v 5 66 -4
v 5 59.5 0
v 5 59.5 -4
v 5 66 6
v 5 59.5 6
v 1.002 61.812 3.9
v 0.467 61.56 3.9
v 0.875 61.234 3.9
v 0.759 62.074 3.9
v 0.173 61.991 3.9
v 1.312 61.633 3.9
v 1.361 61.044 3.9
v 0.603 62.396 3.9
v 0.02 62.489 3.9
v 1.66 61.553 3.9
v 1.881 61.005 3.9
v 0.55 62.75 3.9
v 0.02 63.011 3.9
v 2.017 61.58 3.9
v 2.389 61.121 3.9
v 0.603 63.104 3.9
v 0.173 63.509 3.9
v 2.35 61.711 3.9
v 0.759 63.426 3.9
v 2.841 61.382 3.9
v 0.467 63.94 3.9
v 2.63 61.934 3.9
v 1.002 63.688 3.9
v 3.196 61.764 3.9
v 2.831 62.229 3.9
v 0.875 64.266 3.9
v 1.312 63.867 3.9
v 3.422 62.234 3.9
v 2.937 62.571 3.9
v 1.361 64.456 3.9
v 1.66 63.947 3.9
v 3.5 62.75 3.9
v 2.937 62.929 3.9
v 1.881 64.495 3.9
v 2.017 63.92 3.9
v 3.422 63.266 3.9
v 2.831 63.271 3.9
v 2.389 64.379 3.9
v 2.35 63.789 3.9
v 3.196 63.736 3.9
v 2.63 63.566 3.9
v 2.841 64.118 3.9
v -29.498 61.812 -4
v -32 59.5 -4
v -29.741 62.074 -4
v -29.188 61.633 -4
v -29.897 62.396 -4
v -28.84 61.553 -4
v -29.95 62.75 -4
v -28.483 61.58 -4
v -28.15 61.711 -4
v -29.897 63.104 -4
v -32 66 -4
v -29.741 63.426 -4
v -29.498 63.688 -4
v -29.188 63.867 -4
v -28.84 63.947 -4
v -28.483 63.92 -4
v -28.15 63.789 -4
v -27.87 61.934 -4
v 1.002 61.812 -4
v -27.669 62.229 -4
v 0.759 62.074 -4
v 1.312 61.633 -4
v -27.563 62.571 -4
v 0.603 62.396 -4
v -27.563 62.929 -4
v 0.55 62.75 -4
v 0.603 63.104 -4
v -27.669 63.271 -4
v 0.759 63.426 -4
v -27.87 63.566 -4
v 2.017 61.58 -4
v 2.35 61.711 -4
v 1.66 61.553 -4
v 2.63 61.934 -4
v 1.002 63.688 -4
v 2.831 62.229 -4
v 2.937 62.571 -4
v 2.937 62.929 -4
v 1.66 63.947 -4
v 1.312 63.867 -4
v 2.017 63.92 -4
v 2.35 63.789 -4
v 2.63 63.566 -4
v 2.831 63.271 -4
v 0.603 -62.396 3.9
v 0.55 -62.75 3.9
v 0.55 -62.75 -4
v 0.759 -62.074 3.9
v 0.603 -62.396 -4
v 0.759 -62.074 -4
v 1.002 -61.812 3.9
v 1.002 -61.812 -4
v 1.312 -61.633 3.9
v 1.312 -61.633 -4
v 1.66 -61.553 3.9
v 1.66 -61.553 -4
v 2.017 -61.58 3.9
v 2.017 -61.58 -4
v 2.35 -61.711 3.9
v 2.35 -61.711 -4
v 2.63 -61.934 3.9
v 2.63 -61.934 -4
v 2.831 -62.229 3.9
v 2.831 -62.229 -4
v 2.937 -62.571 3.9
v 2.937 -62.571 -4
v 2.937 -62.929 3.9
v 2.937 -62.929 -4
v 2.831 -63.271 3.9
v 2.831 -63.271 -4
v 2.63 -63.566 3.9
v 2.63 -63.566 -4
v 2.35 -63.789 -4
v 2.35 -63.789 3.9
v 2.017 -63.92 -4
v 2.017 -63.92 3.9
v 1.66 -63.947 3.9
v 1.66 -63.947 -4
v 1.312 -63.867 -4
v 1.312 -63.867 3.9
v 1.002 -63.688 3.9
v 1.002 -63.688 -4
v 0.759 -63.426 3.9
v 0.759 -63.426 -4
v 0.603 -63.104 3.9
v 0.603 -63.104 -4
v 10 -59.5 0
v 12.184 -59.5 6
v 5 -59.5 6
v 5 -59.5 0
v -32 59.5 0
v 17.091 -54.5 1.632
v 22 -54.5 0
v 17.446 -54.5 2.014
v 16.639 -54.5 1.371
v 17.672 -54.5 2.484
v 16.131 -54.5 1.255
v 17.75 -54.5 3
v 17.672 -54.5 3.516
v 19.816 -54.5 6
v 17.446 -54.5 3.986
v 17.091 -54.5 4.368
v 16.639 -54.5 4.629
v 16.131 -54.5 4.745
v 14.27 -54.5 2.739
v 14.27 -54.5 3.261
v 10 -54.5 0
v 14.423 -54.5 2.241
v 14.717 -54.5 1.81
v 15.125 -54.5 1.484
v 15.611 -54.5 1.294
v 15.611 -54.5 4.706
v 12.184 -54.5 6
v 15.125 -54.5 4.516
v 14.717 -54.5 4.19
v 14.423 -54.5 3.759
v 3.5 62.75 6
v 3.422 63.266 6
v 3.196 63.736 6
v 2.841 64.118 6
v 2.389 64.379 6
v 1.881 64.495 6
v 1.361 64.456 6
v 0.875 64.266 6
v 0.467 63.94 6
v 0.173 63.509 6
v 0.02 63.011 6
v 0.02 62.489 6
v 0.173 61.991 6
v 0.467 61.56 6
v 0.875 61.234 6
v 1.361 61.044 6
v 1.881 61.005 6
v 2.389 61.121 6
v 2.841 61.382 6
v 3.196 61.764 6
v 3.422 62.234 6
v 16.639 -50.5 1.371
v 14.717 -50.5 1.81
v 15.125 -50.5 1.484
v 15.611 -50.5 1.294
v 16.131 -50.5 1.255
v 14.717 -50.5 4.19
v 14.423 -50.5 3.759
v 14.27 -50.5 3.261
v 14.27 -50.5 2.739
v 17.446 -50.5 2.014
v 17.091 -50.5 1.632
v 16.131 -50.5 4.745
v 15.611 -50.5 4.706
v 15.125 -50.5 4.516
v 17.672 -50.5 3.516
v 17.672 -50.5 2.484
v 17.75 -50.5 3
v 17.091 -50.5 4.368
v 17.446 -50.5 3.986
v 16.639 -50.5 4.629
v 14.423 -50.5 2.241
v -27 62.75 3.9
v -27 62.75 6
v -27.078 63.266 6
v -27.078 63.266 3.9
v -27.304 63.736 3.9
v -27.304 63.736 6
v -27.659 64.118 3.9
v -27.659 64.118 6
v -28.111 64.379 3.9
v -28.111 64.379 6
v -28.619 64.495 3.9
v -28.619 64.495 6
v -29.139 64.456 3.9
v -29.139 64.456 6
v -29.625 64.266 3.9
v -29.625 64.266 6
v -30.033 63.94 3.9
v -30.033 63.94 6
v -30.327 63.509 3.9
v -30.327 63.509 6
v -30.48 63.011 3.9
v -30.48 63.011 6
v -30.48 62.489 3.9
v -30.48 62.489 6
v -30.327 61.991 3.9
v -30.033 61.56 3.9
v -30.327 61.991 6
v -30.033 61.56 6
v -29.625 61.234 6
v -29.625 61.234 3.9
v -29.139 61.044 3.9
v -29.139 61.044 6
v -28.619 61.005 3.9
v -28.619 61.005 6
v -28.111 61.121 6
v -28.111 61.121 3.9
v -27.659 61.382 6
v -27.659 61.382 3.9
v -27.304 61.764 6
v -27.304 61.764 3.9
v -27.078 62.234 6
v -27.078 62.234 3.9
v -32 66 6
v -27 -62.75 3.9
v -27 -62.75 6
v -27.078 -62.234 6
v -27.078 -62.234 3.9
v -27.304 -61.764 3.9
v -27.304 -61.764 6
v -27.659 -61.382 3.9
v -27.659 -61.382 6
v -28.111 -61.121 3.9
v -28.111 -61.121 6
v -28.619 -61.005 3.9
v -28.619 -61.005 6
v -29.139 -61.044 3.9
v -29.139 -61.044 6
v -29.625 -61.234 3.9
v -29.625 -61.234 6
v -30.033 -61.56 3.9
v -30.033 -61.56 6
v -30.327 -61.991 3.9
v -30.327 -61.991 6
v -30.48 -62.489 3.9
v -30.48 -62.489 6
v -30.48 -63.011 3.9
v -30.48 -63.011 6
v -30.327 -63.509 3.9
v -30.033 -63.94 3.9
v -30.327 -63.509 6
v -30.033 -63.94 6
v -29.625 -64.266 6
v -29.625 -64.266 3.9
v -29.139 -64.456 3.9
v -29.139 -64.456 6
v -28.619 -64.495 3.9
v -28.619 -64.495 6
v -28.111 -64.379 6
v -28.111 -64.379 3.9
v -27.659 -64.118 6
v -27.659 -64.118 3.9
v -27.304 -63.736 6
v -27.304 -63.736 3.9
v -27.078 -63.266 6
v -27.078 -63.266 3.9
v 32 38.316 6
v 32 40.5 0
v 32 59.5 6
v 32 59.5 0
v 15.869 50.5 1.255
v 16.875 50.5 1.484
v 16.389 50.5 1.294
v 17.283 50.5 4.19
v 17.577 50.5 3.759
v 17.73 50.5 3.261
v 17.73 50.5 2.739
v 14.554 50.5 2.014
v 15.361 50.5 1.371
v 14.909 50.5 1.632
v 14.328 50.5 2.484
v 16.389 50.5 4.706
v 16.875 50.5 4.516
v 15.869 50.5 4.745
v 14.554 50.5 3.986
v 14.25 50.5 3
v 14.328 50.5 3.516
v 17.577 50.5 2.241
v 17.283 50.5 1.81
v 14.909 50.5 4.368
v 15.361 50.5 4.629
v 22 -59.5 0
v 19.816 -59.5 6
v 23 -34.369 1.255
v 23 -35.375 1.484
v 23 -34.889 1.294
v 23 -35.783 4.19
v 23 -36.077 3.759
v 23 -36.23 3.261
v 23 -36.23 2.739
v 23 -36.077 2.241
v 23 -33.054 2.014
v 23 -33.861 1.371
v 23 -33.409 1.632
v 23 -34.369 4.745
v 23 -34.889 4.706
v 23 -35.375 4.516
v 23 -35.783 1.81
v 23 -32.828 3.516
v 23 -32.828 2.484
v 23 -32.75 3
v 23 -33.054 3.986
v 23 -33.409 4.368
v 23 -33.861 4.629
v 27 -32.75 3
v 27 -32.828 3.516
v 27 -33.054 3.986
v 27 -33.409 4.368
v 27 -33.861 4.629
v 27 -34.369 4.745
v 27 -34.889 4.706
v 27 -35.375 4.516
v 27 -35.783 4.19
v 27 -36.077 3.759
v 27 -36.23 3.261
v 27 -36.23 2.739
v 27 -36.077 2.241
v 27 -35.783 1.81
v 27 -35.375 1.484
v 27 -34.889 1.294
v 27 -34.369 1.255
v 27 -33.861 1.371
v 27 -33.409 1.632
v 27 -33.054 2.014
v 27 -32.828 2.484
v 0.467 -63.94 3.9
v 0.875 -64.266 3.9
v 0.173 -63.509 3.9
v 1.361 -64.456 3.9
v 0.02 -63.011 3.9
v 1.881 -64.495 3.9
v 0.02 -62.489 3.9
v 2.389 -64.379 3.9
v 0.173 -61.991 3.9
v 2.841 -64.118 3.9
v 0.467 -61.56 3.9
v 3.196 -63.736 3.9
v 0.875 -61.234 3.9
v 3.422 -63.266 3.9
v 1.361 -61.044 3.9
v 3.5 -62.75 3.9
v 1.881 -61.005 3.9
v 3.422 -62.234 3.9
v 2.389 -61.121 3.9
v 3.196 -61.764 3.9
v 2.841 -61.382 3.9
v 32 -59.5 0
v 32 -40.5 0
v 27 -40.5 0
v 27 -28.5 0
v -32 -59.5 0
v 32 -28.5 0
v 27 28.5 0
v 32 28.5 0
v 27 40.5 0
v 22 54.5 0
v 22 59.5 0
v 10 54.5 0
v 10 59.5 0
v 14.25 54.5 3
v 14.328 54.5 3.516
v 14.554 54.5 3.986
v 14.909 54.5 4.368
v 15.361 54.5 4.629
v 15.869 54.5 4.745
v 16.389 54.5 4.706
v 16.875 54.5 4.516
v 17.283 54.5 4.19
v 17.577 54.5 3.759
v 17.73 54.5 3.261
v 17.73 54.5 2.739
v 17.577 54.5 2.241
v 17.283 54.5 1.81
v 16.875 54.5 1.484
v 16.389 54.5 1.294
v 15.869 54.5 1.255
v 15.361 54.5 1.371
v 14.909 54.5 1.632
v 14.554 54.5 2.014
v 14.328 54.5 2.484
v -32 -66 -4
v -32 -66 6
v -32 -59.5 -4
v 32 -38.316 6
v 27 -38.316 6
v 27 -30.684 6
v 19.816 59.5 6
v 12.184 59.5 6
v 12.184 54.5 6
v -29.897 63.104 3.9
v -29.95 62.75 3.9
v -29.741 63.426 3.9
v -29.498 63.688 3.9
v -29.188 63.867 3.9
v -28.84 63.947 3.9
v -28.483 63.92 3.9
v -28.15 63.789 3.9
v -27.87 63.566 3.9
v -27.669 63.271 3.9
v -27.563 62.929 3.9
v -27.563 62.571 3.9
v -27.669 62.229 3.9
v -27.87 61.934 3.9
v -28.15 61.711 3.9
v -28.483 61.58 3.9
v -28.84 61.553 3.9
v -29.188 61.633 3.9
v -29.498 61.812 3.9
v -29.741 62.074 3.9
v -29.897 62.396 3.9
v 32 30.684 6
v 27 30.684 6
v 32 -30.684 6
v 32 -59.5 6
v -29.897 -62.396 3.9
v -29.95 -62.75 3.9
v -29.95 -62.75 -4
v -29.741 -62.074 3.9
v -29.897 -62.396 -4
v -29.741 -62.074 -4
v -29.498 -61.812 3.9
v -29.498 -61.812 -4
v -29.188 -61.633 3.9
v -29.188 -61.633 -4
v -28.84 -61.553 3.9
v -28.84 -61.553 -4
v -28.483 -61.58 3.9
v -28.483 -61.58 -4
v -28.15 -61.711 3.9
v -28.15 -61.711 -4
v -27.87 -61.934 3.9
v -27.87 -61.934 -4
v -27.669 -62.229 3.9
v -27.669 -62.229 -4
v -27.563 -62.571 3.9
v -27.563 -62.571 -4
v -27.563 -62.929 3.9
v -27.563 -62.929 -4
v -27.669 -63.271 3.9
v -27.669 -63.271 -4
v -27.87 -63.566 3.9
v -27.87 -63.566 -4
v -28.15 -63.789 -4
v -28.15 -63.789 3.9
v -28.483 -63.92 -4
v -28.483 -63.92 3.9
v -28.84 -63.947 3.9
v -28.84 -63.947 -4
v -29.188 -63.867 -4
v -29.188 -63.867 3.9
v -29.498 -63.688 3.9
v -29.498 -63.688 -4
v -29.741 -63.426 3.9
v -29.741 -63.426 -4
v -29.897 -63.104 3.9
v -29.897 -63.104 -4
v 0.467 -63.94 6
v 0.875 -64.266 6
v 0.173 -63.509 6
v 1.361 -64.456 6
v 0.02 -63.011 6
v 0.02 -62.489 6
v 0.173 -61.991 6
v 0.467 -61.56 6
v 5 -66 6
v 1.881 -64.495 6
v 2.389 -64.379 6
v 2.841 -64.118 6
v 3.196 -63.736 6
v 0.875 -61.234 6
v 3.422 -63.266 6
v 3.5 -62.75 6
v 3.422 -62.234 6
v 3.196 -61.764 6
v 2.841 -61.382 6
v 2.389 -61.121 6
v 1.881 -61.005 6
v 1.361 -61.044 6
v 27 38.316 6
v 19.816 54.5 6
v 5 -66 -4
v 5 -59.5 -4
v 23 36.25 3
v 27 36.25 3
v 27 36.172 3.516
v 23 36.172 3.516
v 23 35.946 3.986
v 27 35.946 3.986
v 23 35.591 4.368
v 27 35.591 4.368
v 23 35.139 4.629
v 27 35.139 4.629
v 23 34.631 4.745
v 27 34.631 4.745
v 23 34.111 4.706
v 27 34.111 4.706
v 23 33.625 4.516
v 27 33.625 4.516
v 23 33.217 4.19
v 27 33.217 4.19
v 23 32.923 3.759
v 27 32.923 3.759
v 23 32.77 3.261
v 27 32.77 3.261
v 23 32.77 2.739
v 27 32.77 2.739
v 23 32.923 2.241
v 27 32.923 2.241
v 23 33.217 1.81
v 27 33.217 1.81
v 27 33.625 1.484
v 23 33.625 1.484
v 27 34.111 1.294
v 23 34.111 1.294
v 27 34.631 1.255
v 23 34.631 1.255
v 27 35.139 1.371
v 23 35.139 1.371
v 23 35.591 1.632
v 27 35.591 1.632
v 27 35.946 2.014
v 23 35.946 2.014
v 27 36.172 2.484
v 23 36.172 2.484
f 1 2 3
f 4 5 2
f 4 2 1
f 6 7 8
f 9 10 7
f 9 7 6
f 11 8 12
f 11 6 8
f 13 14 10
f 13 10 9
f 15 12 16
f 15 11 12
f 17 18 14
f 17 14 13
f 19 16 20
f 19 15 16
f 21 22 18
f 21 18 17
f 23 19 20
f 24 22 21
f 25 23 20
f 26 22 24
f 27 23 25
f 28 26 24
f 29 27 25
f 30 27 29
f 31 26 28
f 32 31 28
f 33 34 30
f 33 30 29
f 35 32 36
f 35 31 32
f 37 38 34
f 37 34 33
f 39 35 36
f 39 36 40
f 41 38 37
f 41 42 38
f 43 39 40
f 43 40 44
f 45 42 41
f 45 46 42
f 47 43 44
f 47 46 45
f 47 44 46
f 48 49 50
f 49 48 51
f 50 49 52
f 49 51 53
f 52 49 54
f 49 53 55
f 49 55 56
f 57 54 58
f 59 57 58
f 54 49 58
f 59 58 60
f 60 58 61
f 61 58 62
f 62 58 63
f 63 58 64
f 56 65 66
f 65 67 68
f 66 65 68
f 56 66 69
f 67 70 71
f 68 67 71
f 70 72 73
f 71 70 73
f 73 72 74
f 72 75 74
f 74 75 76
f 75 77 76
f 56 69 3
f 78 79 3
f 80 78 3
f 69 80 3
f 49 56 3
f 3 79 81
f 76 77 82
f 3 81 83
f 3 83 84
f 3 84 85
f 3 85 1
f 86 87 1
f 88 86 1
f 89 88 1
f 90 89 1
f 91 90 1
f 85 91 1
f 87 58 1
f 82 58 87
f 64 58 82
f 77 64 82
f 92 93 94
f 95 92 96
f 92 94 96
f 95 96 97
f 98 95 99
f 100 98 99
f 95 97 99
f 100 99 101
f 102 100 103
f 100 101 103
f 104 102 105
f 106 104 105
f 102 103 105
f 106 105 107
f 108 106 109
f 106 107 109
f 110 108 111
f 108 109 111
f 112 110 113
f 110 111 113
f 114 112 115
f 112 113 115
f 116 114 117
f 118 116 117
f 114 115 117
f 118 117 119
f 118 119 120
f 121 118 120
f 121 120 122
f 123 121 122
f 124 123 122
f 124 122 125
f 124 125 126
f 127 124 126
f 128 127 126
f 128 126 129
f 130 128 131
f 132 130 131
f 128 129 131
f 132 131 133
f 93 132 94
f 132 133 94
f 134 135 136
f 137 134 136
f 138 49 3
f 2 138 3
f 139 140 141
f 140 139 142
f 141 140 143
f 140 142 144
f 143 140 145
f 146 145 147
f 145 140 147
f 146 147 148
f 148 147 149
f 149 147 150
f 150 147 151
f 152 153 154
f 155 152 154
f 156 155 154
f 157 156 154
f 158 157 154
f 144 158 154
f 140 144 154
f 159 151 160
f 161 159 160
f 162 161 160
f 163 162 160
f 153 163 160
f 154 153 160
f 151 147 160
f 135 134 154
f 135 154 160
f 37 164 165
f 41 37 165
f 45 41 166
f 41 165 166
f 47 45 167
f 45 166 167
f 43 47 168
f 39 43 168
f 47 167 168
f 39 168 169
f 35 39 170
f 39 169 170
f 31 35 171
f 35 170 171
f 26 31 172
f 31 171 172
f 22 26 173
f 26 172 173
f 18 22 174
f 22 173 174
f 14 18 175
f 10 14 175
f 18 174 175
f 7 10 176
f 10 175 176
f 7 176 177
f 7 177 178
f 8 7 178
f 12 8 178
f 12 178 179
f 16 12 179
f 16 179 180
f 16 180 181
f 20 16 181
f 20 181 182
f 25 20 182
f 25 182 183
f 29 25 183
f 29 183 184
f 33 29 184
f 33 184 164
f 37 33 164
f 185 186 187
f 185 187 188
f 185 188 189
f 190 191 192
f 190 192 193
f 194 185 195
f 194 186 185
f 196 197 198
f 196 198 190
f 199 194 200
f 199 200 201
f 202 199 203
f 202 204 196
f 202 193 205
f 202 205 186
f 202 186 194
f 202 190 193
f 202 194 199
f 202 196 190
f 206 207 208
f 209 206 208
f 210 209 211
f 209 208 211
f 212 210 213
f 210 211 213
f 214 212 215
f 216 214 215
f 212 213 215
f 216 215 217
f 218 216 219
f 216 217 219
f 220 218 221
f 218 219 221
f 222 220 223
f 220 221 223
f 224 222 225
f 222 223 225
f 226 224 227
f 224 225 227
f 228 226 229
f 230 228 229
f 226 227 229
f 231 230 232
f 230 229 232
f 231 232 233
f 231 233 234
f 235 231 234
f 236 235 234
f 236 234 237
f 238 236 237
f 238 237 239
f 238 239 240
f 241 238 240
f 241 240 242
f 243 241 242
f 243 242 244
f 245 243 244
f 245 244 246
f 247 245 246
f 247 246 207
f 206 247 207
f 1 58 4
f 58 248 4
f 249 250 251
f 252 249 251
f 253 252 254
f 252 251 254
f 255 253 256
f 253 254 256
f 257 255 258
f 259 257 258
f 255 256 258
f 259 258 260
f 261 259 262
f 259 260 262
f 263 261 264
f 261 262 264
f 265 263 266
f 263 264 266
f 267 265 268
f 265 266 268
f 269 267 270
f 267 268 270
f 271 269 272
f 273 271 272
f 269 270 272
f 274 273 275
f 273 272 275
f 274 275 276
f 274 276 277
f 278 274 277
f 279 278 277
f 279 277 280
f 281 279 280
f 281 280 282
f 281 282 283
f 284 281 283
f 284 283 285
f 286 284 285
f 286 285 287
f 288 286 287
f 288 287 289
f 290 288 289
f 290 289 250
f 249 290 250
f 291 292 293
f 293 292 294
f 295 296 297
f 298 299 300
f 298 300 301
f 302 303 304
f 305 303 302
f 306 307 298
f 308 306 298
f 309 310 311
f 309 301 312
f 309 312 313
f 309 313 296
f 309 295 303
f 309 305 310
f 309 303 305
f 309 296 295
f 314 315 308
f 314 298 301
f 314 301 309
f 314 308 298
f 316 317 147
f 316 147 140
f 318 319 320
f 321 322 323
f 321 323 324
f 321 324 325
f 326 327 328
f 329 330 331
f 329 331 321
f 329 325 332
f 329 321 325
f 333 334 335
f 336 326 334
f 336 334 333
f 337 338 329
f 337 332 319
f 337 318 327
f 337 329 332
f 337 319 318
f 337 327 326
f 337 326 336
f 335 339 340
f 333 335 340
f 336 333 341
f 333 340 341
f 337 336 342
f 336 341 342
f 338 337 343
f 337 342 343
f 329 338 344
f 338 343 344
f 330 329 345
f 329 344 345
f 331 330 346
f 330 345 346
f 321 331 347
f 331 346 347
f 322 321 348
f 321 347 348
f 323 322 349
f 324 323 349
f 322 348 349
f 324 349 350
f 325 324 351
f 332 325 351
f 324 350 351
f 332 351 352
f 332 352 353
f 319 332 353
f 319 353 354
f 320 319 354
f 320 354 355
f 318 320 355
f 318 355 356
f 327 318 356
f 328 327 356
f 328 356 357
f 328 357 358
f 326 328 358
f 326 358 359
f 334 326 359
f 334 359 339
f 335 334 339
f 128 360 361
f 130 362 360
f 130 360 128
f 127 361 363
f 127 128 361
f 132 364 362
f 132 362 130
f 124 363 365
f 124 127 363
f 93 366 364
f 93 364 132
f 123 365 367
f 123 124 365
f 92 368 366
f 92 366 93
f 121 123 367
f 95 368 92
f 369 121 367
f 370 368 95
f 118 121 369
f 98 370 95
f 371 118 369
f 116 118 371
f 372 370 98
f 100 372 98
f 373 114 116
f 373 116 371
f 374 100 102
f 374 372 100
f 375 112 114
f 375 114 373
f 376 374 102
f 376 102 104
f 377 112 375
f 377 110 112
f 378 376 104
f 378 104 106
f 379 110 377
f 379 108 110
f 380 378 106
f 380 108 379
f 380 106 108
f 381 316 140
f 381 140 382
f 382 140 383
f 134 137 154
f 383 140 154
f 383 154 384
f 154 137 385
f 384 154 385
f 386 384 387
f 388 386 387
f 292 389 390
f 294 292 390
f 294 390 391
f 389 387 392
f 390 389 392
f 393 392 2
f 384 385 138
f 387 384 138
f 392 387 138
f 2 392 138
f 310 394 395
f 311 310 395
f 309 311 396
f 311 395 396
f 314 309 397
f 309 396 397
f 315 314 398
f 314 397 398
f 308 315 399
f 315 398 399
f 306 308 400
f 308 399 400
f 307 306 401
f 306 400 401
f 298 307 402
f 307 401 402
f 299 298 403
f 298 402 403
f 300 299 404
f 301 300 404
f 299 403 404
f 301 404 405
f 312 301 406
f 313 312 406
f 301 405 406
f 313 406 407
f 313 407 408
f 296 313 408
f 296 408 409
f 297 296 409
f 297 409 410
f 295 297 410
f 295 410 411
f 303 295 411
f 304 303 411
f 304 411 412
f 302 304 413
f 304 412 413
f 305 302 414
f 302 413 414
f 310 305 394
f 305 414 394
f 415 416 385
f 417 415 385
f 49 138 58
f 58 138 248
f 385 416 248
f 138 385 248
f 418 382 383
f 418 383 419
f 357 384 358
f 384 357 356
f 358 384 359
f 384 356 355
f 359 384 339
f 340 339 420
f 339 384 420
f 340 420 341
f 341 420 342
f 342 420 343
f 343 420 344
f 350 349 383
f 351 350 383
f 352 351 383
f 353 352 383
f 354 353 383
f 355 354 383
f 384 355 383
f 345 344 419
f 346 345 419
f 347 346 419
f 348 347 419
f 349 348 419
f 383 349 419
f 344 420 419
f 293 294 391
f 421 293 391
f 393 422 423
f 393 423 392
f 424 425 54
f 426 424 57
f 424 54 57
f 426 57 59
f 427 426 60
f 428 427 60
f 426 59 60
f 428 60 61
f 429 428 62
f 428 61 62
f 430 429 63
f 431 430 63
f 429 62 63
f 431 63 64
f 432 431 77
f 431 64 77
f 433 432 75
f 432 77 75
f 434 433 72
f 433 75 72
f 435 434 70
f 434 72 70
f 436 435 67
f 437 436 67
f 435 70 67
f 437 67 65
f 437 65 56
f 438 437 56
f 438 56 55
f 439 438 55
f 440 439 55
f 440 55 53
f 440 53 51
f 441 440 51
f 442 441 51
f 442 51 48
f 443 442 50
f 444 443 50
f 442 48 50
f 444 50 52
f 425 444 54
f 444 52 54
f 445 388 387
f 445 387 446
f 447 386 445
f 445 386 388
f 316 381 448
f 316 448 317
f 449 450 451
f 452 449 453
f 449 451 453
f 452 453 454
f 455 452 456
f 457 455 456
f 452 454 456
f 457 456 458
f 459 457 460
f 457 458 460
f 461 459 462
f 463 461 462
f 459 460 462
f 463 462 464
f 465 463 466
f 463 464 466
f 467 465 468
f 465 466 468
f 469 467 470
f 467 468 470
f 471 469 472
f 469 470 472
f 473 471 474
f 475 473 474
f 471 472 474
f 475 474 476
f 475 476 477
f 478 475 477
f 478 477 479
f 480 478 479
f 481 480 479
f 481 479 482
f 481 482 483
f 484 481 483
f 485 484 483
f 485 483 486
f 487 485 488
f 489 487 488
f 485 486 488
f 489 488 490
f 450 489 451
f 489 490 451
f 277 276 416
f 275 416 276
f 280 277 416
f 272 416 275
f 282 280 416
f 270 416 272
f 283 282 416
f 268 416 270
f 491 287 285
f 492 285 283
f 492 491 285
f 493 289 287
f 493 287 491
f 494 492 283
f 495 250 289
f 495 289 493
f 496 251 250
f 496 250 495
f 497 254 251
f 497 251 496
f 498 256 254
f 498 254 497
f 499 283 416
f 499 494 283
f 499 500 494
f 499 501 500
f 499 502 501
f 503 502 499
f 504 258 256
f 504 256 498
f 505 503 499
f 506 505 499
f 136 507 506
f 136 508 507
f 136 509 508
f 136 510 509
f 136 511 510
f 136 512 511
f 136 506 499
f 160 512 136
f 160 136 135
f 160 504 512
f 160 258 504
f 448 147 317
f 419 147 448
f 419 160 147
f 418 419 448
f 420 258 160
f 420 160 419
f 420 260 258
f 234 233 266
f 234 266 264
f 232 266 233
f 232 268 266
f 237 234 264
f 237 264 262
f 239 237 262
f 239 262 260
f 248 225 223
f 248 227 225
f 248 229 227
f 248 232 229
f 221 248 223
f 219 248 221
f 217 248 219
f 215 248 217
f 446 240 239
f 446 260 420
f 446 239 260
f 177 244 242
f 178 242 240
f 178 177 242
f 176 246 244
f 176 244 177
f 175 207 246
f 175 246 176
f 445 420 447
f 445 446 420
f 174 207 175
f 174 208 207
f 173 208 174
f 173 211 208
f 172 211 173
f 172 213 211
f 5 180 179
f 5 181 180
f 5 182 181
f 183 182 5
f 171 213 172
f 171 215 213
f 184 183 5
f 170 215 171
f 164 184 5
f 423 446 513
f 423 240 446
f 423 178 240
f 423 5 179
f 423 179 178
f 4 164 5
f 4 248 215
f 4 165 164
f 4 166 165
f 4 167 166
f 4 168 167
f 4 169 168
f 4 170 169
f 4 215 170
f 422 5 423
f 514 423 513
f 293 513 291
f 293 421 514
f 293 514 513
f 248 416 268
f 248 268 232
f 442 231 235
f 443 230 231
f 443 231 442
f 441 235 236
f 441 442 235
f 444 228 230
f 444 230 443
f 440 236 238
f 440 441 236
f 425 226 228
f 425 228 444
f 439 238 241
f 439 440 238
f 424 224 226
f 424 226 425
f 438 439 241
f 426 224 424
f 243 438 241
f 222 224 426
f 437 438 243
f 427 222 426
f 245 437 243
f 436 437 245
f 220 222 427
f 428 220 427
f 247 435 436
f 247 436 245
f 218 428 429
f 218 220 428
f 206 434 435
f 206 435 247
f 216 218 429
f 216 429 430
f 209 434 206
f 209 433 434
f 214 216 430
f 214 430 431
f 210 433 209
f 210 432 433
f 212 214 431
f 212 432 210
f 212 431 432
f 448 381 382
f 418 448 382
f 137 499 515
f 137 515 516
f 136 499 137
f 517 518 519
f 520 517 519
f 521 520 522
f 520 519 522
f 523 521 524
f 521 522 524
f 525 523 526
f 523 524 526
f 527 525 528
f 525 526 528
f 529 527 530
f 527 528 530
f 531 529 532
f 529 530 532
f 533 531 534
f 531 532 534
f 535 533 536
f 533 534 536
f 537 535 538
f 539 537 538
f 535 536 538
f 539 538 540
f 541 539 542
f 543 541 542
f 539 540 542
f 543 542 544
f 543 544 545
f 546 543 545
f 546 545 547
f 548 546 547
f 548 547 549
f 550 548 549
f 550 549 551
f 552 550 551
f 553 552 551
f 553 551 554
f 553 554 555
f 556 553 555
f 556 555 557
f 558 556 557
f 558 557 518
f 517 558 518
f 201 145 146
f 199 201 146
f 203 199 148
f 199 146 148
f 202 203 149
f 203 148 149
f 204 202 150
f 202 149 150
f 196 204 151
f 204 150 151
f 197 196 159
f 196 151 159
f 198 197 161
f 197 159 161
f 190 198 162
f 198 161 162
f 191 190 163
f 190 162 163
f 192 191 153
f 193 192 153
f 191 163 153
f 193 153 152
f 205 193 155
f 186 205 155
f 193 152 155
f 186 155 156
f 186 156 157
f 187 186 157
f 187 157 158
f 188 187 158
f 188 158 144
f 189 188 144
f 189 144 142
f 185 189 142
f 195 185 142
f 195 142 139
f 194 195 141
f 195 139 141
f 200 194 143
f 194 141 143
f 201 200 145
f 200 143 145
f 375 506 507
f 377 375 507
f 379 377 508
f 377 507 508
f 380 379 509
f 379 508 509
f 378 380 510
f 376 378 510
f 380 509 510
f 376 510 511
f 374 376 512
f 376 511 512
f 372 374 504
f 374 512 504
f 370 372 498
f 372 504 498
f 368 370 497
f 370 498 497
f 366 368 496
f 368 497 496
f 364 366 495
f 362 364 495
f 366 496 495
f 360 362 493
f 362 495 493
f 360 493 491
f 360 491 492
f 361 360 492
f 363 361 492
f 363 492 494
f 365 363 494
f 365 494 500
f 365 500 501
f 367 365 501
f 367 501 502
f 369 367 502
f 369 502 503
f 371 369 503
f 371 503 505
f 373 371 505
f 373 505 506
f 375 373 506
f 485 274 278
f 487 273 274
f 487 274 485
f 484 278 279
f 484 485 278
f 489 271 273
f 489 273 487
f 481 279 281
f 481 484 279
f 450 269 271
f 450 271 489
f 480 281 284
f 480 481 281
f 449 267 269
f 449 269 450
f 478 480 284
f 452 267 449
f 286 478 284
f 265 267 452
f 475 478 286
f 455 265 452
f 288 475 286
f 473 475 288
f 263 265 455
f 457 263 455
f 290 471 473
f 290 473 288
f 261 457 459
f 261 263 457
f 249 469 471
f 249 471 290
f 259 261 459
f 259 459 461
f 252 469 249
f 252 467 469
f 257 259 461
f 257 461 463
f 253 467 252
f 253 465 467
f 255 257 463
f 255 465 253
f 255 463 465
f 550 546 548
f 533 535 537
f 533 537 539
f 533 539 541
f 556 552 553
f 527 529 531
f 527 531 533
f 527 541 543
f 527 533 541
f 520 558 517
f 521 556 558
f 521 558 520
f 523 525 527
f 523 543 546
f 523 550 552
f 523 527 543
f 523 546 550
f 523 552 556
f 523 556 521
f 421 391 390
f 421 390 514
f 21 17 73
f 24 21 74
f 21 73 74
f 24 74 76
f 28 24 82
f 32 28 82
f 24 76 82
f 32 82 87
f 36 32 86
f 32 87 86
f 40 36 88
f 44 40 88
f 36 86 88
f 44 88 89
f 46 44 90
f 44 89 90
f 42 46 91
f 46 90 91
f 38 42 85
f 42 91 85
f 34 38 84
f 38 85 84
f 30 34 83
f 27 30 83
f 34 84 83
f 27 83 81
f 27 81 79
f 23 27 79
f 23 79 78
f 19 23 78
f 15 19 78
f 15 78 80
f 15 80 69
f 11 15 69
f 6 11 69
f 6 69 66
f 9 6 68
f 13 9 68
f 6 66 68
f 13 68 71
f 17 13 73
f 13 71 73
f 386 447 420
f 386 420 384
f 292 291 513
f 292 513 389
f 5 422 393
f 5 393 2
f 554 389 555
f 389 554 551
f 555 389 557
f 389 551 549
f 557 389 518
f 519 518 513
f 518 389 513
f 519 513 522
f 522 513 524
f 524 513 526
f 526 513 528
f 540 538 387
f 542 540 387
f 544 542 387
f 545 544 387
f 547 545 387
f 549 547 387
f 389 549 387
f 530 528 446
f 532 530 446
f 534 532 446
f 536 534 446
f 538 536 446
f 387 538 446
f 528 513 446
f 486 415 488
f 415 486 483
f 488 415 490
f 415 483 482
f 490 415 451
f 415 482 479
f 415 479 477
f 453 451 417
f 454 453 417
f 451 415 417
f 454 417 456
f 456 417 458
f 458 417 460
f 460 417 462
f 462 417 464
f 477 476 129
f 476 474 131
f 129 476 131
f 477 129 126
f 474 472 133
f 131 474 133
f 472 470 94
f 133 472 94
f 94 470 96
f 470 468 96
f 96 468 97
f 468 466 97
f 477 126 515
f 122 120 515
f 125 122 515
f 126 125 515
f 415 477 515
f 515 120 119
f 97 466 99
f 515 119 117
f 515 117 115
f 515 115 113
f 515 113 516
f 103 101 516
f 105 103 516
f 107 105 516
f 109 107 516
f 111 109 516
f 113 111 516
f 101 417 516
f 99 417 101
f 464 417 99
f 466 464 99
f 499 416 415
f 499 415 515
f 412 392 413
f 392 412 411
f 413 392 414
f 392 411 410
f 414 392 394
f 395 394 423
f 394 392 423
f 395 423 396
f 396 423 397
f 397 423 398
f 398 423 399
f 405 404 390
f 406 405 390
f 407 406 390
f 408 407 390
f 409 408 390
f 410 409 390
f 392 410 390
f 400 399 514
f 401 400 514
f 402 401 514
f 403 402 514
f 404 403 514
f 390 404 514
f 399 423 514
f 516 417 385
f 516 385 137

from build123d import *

# Parameters (mm, degrees)
SKETCH050_W      = 37
SKETCH050_H      = 132
PAD_DEPTH        = 6
PAD_DEPTH_BACK   = 4
SKETCH051_W      = 37
SKETCH051_H      = 119
POCKET006_DEPTH  = 4
HOLE_D           = 2.4
HOLE_DEPTH       = 25
HOLE_CBORE_D     = 3.5
HOLE_CBORE_DEPTH = 2.1
BINDER020_W      = 119
BINDER020_H      = 64
PAD012_DEPTH     = 6
SKETCH_R         = 1.75
POCKET_DEPTH     = 9
POCKET001_DEPTH  = 5
POCKET002_DEPTH  = 5
SKETCH046_R      = 1.75
POCKET003_DEPTH  = 4
POCKET004_DEPTH  = 5
SKETCH048_R      = 1.75
POCKET005_DEPTH  = 4


with BuildPart() as ch002:
    # Sketch050 (on Face1 of Binder) → Pad (new body, two sides)
    with BuildSketch(Plane.XY) as pad_sk:
        with Locations((-13.5, 0)):
            Rectangle(SKETCH050_W, SKETCH050_H)
    extrude(amount=PAD_DEPTH)
    extrude(pad_sk.sketch, amount=-PAD_DEPTH_BACK)

    # Sketch051 (on Face5 of Pad) → Pocket006 (cut)
    with BuildSketch(Plane(origin=(0, 0, -4), x_dir=(1, 0, 0), z_dir=(0, 0, -1))):
        with Locations((-13.5, 0)):
            Rectangle(SKETCH051_W, SKETCH051_H)
    extrude(amount=-POCKET006_DEPTH, mode=Mode.SUBTRACT)

    # Hole
    with Locations(Plane.XY.offset(6)):
        with Locations((-28.75, 62.75), (1.75, 62.75), (-28.75, -62.75), (1.75, -62.75)):
            CounterBoreHole(HOLE_D / 2, HOLE_CBORE_D / 2, HOLE_CBORE_DEPTH, depth=HOLE_DEPTH)


with BuildPart() as fusion:
    # Binder020 → Pad012 (new body)
    with BuildSketch(Plane(origin=(0, 0, 0), x_dir=(0, 1, 0), z_dir=(0, 0, 1))):
        Rectangle(BINDER020_W, BINDER020_H)
    extrude(amount=PAD012_DEPTH)

    # Sketch (on Face2 of Pad012) → Pocket (cut)
    with BuildSketch(Plane.YZ.offset(32)):
        with Locations((-34.5, 3)):
            Circle(SKETCH_R)
        with Locations((34.5, 3)):
            Circle(SKETCH_R)
    extrude(amount=-POCKET_DEPTH, mode=Mode.SUBTRACT)

    # Sketch044 (on Face3 of Pocket) → Pocket001 (cut)
    with BuildSketch(Plane.YZ.offset(32)):
        Polygon((-40.5, 0), (-38.316179, 6), (-30.683821, 6), (-28.5, 0), align=None)
        Polygon((30.683821, 6), (38.316179, 6), (40.5, 0), (28.5, 0), align=None)
    extrude(amount=-POCKET001_DEPTH, mode=Mode.SUBTRACT)

    # Sketch045 (on Face1 of Pocket001) → Pocket002 (cut)
    with BuildSketch(Plane.XZ.offset(59.5)):
        Polygon((10, 0), (12.183821, 6), (19.816179, 6), (22, 0), align=None)
    extrude(amount=-POCKET002_DEPTH, mode=Mode.SUBTRACT)

    # Sketch046 (on Face18 of Pocket002) → Pocket003 (cut)
    with BuildSketch(Plane.XZ.offset(54.5)):
        with Locations((16, 3)):
            Circle(SKETCH046_R)
    extrude(amount=-POCKET003_DEPTH, mode=Mode.SUBTRACT)

    # Sketch047 (on Face6 of Pocket003) → Pocket004 (cut)
    with BuildSketch(Plane(origin=(0, 59.5, 0), x_dir=(-1, 0, 0), z_dir=(0, 1, 0))):
        Polygon((-22, 0), (-19.816179, 6), (-12.183821, 6), (-10, 0), align=None)
    extrude(amount=-POCKET004_DEPTH, mode=Mode.SUBTRACT)

    # Sketch048 (on Face20 of Pocket004) → Pocket005 (cut)
    with BuildSketch(Plane(origin=(0, 54.5, 0), x_dir=(-1, 0, 0), z_dir=(0, 1, 0))):
        with Locations((-16, 3)):
            Circle(SKETCH048_R)
    extrude(amount=-POCKET005_DEPTH, mode=Mode.SUBTRACT)

    # Fusion: union CH002
    add(ch002.part)


solid = fusion.part
